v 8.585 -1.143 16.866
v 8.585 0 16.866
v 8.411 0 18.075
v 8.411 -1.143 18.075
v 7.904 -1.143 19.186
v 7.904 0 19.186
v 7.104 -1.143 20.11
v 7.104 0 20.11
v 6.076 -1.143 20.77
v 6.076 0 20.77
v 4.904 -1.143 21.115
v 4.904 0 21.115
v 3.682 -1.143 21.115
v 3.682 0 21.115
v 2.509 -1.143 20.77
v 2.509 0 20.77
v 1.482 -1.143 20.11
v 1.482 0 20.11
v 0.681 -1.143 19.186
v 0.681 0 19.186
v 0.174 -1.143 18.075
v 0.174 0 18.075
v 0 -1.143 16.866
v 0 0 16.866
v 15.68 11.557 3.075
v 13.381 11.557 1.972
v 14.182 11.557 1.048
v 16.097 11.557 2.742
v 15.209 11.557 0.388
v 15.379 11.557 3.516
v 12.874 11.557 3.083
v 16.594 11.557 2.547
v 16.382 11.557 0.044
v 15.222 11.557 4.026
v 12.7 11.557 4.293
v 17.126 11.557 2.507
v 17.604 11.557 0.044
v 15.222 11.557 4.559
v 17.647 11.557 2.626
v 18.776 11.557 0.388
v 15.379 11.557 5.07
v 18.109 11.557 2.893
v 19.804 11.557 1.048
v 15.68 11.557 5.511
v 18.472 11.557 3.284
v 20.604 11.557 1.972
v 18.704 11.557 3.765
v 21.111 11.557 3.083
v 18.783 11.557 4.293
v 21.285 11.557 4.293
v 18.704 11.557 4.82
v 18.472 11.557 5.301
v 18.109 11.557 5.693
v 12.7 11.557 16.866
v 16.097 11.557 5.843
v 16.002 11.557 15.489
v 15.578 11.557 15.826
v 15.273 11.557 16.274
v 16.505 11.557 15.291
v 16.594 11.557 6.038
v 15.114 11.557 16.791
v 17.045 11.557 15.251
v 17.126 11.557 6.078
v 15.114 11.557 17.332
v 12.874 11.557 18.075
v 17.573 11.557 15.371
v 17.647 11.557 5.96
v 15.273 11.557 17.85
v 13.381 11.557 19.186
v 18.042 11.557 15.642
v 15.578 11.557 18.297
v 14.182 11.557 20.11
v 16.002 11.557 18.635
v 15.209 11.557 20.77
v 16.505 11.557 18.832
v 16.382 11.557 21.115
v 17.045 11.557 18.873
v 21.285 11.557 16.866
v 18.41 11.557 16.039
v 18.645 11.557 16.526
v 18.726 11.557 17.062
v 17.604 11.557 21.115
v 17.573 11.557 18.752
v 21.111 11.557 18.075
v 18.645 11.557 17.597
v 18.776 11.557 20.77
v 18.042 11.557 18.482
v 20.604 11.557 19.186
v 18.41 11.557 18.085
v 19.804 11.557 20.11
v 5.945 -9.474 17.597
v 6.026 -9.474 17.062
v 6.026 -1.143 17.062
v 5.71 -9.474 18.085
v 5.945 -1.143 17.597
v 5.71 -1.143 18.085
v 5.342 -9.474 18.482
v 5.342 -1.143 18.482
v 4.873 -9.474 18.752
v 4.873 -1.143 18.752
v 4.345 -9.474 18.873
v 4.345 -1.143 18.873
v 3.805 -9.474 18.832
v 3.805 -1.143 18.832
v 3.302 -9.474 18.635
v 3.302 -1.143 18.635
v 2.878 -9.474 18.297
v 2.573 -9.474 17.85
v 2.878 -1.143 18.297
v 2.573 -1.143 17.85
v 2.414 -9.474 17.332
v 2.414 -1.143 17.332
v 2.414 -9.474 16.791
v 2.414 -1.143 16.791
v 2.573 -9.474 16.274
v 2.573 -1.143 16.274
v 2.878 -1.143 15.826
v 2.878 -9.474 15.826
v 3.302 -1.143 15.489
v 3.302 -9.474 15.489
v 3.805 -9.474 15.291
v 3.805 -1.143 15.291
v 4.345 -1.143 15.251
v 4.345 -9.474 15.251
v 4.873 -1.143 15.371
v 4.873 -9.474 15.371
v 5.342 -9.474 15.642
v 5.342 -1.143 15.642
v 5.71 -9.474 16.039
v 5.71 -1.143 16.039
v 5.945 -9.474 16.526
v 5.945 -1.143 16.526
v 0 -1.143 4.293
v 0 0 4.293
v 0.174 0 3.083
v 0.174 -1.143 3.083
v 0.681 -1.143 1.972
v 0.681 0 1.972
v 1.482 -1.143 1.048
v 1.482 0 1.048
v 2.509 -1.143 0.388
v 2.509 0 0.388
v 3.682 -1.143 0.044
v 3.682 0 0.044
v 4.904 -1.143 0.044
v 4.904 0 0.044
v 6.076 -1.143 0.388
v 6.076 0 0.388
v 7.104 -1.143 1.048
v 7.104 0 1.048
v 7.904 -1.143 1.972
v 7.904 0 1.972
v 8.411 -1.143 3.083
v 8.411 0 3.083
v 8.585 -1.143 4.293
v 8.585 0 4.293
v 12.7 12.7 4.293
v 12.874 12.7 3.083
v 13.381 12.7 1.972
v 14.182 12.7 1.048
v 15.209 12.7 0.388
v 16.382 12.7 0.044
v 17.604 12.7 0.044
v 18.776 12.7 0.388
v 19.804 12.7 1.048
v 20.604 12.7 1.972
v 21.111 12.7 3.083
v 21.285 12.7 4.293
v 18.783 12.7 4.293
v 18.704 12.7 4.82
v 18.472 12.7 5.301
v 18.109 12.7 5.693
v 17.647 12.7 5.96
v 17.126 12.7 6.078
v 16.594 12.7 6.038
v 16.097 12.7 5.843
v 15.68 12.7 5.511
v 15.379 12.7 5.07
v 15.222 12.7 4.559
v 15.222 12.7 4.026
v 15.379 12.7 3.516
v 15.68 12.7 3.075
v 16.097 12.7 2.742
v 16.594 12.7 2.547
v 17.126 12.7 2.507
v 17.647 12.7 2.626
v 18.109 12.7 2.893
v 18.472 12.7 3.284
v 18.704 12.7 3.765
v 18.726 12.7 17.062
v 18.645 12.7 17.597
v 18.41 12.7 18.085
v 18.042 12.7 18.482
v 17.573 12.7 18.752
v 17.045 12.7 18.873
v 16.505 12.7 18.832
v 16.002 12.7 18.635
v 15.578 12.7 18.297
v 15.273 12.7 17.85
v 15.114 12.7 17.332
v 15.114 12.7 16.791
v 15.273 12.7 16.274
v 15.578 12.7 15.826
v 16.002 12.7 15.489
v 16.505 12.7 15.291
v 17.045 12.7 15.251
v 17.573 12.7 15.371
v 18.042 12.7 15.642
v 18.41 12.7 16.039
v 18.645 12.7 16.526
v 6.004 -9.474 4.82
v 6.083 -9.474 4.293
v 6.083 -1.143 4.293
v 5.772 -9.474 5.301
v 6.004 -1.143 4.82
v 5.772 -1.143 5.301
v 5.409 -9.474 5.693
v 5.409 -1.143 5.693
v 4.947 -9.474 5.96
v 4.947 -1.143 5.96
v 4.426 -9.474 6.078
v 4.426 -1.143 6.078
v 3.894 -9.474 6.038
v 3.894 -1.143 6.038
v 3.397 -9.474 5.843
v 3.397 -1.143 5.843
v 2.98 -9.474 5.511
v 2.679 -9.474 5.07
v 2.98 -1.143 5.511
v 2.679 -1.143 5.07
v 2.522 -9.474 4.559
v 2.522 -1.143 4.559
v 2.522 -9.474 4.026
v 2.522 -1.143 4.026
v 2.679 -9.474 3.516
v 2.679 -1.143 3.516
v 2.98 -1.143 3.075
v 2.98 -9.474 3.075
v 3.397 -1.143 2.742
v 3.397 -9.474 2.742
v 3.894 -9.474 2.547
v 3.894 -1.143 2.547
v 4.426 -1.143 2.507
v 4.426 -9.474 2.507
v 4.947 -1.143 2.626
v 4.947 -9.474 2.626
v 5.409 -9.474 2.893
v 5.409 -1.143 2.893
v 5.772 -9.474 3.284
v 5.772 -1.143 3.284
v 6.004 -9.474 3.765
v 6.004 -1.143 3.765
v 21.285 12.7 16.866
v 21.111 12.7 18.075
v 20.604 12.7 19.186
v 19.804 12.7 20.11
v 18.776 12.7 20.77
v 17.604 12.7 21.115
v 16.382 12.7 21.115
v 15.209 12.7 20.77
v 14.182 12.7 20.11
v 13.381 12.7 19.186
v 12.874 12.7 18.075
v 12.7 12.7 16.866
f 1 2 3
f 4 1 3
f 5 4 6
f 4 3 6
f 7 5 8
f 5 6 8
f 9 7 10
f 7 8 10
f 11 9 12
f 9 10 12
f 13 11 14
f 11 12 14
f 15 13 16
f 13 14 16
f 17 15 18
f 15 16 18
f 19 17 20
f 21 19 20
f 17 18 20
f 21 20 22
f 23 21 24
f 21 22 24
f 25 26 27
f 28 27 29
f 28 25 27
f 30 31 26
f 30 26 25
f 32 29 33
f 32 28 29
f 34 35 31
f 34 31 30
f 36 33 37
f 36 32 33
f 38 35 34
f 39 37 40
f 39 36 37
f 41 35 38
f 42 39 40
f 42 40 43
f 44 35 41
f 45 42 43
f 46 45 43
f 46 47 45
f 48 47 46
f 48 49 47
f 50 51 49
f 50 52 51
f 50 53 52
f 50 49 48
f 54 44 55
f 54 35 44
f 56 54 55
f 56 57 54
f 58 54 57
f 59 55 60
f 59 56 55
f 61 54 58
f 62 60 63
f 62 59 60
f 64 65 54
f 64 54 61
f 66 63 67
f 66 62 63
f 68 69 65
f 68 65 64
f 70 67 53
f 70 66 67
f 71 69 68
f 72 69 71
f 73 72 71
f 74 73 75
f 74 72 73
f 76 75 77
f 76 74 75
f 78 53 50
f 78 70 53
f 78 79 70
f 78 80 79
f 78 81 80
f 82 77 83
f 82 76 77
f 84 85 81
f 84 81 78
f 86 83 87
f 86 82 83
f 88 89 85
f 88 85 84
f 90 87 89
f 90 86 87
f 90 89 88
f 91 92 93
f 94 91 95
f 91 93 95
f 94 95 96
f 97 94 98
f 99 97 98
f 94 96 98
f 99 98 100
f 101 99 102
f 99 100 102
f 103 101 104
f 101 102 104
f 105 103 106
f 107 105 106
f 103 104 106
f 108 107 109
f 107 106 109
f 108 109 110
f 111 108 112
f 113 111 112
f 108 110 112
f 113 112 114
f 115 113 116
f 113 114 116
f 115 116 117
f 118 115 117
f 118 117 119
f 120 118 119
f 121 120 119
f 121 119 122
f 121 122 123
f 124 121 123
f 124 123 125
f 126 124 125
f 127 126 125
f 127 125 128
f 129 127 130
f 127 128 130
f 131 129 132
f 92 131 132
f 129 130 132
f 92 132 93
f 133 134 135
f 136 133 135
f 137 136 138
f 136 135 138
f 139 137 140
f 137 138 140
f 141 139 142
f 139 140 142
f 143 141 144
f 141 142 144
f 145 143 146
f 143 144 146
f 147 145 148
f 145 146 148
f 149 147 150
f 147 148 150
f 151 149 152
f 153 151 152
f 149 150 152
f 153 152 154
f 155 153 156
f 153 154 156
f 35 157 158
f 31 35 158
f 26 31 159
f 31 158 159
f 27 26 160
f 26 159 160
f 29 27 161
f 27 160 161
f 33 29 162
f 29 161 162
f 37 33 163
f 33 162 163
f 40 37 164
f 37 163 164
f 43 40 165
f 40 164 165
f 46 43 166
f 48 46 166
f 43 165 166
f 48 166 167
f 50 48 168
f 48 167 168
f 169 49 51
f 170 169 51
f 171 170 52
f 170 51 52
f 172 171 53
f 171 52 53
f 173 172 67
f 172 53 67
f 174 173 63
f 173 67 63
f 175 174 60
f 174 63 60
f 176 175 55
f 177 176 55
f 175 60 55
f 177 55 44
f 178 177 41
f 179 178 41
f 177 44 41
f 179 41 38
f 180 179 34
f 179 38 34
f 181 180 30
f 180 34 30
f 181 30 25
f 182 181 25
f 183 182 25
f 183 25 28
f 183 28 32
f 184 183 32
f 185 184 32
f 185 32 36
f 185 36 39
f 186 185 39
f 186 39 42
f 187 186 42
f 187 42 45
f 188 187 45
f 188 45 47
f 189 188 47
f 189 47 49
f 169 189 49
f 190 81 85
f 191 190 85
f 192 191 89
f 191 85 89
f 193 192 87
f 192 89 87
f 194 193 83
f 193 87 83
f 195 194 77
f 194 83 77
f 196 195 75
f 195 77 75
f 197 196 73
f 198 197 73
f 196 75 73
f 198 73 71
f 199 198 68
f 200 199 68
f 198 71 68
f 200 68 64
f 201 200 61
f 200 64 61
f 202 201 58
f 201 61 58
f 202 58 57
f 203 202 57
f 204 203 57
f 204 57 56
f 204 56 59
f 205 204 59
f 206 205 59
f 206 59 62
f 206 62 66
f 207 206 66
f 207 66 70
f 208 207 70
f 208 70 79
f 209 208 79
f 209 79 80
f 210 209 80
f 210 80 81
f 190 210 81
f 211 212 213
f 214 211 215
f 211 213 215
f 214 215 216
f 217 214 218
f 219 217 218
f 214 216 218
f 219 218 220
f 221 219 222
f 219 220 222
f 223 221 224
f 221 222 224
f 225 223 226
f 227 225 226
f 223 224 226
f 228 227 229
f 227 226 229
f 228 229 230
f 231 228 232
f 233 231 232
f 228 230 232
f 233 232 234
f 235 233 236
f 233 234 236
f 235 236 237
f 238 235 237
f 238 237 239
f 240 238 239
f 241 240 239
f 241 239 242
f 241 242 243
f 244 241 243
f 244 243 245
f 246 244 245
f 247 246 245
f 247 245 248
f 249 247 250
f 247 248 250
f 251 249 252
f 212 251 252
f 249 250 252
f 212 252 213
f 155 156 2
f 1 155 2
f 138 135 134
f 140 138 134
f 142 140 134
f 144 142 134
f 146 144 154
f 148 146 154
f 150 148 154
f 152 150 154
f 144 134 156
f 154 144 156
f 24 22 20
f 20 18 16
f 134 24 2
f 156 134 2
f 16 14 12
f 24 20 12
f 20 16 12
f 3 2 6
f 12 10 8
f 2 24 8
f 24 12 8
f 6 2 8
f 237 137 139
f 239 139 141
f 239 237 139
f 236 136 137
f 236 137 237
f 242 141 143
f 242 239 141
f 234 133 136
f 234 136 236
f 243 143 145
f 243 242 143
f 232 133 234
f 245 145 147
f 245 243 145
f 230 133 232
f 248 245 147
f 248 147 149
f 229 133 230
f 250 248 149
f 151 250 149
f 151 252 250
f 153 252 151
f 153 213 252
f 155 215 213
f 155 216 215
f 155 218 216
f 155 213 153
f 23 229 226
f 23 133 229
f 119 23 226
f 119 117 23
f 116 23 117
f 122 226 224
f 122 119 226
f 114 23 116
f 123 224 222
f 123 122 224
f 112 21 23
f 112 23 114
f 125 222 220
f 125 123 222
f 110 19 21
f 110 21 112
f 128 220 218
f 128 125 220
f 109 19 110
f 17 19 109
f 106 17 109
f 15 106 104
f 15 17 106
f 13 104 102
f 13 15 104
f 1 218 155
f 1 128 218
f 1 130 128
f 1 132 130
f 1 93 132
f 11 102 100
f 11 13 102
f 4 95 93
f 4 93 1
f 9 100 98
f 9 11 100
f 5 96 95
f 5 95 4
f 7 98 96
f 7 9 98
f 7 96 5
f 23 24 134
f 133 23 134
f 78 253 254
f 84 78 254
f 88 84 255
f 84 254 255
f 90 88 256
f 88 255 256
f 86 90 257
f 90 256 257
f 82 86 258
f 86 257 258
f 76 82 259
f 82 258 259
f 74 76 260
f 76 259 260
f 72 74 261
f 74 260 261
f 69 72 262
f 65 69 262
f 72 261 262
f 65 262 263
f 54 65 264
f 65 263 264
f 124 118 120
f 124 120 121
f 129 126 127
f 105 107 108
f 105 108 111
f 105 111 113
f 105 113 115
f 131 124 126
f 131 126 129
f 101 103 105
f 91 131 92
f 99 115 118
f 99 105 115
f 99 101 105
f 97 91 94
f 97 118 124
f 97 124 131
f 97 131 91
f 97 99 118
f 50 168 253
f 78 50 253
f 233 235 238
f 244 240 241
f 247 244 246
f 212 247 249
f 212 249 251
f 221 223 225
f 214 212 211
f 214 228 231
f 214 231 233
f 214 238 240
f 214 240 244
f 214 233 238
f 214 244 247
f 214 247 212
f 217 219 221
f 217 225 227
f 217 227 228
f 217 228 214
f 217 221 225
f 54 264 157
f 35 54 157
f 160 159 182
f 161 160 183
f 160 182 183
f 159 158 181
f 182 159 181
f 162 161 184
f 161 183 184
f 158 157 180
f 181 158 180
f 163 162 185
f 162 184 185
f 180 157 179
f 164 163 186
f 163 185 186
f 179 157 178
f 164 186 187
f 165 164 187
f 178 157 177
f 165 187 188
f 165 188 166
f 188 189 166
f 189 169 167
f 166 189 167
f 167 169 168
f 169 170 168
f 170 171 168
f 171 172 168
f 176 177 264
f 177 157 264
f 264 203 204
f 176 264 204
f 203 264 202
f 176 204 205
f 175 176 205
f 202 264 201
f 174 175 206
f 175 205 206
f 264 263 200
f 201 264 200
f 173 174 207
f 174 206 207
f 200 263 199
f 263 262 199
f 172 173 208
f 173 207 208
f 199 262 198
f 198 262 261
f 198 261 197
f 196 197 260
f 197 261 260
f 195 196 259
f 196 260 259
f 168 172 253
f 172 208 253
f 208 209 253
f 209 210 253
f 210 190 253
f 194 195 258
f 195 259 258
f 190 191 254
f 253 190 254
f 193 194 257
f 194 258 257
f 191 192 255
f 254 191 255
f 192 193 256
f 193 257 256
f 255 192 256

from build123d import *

# Parameters (mm, degrees)
F1_DEPTH = 1.143
F2_R     = 1.7907
F2_R_2   = 1.8161
F3_DEPTH = 8.3312
F5_DEPTH = 25.4


with BuildPart() as f1:
    # F0 (on Front) → F1 (new body)
    with BuildSketch(Plane.XZ):
        with BuildLine():
            Line((0, 16.8656), (0, 4.2926))
            ThreePointArc((0, 4.2926), (4.2926, 0), (8.5852, 4.2926))
            Line((8.5852, 4.2926), (8.5852, 16.8656))
            ThreePointArc((8.5852, 16.8656), (4.2926, 21.1582), (0, 16.8656))
        make_face()
    extrude(amount=F1_DEPTH)

    # F2 (on face) → F3 (join)
    with BuildSketch(Plane.XZ.offset(1.143)):
        with Locations((4.2926, 4.2926)):
            Circle(F2_R)
        with Locations((4.2095552199, 17.0617327094)):
            Circle(F2_R_2)
    extrude(amount=F3_DEPTH)


with BuildPart() as f4_1:
    # F4: copy of F1
    add(f1.part.moved(Location((12.7, 12.7, 0))))

    # F5 (cut): faces of the model
    f5_faces = [f4_1.faces().sort_by_distance(p)[0] for p in [
        (16.9095552199, 3.2258, 17.0617327094),
        (16.9926, 3.2258, 4.2926),
    ]]
    extrude(f5_faces, amount=-F5_DEPTH, mode=Mode.SUBTRACT)


solid = Compound([f1.part, f4_1.part])
